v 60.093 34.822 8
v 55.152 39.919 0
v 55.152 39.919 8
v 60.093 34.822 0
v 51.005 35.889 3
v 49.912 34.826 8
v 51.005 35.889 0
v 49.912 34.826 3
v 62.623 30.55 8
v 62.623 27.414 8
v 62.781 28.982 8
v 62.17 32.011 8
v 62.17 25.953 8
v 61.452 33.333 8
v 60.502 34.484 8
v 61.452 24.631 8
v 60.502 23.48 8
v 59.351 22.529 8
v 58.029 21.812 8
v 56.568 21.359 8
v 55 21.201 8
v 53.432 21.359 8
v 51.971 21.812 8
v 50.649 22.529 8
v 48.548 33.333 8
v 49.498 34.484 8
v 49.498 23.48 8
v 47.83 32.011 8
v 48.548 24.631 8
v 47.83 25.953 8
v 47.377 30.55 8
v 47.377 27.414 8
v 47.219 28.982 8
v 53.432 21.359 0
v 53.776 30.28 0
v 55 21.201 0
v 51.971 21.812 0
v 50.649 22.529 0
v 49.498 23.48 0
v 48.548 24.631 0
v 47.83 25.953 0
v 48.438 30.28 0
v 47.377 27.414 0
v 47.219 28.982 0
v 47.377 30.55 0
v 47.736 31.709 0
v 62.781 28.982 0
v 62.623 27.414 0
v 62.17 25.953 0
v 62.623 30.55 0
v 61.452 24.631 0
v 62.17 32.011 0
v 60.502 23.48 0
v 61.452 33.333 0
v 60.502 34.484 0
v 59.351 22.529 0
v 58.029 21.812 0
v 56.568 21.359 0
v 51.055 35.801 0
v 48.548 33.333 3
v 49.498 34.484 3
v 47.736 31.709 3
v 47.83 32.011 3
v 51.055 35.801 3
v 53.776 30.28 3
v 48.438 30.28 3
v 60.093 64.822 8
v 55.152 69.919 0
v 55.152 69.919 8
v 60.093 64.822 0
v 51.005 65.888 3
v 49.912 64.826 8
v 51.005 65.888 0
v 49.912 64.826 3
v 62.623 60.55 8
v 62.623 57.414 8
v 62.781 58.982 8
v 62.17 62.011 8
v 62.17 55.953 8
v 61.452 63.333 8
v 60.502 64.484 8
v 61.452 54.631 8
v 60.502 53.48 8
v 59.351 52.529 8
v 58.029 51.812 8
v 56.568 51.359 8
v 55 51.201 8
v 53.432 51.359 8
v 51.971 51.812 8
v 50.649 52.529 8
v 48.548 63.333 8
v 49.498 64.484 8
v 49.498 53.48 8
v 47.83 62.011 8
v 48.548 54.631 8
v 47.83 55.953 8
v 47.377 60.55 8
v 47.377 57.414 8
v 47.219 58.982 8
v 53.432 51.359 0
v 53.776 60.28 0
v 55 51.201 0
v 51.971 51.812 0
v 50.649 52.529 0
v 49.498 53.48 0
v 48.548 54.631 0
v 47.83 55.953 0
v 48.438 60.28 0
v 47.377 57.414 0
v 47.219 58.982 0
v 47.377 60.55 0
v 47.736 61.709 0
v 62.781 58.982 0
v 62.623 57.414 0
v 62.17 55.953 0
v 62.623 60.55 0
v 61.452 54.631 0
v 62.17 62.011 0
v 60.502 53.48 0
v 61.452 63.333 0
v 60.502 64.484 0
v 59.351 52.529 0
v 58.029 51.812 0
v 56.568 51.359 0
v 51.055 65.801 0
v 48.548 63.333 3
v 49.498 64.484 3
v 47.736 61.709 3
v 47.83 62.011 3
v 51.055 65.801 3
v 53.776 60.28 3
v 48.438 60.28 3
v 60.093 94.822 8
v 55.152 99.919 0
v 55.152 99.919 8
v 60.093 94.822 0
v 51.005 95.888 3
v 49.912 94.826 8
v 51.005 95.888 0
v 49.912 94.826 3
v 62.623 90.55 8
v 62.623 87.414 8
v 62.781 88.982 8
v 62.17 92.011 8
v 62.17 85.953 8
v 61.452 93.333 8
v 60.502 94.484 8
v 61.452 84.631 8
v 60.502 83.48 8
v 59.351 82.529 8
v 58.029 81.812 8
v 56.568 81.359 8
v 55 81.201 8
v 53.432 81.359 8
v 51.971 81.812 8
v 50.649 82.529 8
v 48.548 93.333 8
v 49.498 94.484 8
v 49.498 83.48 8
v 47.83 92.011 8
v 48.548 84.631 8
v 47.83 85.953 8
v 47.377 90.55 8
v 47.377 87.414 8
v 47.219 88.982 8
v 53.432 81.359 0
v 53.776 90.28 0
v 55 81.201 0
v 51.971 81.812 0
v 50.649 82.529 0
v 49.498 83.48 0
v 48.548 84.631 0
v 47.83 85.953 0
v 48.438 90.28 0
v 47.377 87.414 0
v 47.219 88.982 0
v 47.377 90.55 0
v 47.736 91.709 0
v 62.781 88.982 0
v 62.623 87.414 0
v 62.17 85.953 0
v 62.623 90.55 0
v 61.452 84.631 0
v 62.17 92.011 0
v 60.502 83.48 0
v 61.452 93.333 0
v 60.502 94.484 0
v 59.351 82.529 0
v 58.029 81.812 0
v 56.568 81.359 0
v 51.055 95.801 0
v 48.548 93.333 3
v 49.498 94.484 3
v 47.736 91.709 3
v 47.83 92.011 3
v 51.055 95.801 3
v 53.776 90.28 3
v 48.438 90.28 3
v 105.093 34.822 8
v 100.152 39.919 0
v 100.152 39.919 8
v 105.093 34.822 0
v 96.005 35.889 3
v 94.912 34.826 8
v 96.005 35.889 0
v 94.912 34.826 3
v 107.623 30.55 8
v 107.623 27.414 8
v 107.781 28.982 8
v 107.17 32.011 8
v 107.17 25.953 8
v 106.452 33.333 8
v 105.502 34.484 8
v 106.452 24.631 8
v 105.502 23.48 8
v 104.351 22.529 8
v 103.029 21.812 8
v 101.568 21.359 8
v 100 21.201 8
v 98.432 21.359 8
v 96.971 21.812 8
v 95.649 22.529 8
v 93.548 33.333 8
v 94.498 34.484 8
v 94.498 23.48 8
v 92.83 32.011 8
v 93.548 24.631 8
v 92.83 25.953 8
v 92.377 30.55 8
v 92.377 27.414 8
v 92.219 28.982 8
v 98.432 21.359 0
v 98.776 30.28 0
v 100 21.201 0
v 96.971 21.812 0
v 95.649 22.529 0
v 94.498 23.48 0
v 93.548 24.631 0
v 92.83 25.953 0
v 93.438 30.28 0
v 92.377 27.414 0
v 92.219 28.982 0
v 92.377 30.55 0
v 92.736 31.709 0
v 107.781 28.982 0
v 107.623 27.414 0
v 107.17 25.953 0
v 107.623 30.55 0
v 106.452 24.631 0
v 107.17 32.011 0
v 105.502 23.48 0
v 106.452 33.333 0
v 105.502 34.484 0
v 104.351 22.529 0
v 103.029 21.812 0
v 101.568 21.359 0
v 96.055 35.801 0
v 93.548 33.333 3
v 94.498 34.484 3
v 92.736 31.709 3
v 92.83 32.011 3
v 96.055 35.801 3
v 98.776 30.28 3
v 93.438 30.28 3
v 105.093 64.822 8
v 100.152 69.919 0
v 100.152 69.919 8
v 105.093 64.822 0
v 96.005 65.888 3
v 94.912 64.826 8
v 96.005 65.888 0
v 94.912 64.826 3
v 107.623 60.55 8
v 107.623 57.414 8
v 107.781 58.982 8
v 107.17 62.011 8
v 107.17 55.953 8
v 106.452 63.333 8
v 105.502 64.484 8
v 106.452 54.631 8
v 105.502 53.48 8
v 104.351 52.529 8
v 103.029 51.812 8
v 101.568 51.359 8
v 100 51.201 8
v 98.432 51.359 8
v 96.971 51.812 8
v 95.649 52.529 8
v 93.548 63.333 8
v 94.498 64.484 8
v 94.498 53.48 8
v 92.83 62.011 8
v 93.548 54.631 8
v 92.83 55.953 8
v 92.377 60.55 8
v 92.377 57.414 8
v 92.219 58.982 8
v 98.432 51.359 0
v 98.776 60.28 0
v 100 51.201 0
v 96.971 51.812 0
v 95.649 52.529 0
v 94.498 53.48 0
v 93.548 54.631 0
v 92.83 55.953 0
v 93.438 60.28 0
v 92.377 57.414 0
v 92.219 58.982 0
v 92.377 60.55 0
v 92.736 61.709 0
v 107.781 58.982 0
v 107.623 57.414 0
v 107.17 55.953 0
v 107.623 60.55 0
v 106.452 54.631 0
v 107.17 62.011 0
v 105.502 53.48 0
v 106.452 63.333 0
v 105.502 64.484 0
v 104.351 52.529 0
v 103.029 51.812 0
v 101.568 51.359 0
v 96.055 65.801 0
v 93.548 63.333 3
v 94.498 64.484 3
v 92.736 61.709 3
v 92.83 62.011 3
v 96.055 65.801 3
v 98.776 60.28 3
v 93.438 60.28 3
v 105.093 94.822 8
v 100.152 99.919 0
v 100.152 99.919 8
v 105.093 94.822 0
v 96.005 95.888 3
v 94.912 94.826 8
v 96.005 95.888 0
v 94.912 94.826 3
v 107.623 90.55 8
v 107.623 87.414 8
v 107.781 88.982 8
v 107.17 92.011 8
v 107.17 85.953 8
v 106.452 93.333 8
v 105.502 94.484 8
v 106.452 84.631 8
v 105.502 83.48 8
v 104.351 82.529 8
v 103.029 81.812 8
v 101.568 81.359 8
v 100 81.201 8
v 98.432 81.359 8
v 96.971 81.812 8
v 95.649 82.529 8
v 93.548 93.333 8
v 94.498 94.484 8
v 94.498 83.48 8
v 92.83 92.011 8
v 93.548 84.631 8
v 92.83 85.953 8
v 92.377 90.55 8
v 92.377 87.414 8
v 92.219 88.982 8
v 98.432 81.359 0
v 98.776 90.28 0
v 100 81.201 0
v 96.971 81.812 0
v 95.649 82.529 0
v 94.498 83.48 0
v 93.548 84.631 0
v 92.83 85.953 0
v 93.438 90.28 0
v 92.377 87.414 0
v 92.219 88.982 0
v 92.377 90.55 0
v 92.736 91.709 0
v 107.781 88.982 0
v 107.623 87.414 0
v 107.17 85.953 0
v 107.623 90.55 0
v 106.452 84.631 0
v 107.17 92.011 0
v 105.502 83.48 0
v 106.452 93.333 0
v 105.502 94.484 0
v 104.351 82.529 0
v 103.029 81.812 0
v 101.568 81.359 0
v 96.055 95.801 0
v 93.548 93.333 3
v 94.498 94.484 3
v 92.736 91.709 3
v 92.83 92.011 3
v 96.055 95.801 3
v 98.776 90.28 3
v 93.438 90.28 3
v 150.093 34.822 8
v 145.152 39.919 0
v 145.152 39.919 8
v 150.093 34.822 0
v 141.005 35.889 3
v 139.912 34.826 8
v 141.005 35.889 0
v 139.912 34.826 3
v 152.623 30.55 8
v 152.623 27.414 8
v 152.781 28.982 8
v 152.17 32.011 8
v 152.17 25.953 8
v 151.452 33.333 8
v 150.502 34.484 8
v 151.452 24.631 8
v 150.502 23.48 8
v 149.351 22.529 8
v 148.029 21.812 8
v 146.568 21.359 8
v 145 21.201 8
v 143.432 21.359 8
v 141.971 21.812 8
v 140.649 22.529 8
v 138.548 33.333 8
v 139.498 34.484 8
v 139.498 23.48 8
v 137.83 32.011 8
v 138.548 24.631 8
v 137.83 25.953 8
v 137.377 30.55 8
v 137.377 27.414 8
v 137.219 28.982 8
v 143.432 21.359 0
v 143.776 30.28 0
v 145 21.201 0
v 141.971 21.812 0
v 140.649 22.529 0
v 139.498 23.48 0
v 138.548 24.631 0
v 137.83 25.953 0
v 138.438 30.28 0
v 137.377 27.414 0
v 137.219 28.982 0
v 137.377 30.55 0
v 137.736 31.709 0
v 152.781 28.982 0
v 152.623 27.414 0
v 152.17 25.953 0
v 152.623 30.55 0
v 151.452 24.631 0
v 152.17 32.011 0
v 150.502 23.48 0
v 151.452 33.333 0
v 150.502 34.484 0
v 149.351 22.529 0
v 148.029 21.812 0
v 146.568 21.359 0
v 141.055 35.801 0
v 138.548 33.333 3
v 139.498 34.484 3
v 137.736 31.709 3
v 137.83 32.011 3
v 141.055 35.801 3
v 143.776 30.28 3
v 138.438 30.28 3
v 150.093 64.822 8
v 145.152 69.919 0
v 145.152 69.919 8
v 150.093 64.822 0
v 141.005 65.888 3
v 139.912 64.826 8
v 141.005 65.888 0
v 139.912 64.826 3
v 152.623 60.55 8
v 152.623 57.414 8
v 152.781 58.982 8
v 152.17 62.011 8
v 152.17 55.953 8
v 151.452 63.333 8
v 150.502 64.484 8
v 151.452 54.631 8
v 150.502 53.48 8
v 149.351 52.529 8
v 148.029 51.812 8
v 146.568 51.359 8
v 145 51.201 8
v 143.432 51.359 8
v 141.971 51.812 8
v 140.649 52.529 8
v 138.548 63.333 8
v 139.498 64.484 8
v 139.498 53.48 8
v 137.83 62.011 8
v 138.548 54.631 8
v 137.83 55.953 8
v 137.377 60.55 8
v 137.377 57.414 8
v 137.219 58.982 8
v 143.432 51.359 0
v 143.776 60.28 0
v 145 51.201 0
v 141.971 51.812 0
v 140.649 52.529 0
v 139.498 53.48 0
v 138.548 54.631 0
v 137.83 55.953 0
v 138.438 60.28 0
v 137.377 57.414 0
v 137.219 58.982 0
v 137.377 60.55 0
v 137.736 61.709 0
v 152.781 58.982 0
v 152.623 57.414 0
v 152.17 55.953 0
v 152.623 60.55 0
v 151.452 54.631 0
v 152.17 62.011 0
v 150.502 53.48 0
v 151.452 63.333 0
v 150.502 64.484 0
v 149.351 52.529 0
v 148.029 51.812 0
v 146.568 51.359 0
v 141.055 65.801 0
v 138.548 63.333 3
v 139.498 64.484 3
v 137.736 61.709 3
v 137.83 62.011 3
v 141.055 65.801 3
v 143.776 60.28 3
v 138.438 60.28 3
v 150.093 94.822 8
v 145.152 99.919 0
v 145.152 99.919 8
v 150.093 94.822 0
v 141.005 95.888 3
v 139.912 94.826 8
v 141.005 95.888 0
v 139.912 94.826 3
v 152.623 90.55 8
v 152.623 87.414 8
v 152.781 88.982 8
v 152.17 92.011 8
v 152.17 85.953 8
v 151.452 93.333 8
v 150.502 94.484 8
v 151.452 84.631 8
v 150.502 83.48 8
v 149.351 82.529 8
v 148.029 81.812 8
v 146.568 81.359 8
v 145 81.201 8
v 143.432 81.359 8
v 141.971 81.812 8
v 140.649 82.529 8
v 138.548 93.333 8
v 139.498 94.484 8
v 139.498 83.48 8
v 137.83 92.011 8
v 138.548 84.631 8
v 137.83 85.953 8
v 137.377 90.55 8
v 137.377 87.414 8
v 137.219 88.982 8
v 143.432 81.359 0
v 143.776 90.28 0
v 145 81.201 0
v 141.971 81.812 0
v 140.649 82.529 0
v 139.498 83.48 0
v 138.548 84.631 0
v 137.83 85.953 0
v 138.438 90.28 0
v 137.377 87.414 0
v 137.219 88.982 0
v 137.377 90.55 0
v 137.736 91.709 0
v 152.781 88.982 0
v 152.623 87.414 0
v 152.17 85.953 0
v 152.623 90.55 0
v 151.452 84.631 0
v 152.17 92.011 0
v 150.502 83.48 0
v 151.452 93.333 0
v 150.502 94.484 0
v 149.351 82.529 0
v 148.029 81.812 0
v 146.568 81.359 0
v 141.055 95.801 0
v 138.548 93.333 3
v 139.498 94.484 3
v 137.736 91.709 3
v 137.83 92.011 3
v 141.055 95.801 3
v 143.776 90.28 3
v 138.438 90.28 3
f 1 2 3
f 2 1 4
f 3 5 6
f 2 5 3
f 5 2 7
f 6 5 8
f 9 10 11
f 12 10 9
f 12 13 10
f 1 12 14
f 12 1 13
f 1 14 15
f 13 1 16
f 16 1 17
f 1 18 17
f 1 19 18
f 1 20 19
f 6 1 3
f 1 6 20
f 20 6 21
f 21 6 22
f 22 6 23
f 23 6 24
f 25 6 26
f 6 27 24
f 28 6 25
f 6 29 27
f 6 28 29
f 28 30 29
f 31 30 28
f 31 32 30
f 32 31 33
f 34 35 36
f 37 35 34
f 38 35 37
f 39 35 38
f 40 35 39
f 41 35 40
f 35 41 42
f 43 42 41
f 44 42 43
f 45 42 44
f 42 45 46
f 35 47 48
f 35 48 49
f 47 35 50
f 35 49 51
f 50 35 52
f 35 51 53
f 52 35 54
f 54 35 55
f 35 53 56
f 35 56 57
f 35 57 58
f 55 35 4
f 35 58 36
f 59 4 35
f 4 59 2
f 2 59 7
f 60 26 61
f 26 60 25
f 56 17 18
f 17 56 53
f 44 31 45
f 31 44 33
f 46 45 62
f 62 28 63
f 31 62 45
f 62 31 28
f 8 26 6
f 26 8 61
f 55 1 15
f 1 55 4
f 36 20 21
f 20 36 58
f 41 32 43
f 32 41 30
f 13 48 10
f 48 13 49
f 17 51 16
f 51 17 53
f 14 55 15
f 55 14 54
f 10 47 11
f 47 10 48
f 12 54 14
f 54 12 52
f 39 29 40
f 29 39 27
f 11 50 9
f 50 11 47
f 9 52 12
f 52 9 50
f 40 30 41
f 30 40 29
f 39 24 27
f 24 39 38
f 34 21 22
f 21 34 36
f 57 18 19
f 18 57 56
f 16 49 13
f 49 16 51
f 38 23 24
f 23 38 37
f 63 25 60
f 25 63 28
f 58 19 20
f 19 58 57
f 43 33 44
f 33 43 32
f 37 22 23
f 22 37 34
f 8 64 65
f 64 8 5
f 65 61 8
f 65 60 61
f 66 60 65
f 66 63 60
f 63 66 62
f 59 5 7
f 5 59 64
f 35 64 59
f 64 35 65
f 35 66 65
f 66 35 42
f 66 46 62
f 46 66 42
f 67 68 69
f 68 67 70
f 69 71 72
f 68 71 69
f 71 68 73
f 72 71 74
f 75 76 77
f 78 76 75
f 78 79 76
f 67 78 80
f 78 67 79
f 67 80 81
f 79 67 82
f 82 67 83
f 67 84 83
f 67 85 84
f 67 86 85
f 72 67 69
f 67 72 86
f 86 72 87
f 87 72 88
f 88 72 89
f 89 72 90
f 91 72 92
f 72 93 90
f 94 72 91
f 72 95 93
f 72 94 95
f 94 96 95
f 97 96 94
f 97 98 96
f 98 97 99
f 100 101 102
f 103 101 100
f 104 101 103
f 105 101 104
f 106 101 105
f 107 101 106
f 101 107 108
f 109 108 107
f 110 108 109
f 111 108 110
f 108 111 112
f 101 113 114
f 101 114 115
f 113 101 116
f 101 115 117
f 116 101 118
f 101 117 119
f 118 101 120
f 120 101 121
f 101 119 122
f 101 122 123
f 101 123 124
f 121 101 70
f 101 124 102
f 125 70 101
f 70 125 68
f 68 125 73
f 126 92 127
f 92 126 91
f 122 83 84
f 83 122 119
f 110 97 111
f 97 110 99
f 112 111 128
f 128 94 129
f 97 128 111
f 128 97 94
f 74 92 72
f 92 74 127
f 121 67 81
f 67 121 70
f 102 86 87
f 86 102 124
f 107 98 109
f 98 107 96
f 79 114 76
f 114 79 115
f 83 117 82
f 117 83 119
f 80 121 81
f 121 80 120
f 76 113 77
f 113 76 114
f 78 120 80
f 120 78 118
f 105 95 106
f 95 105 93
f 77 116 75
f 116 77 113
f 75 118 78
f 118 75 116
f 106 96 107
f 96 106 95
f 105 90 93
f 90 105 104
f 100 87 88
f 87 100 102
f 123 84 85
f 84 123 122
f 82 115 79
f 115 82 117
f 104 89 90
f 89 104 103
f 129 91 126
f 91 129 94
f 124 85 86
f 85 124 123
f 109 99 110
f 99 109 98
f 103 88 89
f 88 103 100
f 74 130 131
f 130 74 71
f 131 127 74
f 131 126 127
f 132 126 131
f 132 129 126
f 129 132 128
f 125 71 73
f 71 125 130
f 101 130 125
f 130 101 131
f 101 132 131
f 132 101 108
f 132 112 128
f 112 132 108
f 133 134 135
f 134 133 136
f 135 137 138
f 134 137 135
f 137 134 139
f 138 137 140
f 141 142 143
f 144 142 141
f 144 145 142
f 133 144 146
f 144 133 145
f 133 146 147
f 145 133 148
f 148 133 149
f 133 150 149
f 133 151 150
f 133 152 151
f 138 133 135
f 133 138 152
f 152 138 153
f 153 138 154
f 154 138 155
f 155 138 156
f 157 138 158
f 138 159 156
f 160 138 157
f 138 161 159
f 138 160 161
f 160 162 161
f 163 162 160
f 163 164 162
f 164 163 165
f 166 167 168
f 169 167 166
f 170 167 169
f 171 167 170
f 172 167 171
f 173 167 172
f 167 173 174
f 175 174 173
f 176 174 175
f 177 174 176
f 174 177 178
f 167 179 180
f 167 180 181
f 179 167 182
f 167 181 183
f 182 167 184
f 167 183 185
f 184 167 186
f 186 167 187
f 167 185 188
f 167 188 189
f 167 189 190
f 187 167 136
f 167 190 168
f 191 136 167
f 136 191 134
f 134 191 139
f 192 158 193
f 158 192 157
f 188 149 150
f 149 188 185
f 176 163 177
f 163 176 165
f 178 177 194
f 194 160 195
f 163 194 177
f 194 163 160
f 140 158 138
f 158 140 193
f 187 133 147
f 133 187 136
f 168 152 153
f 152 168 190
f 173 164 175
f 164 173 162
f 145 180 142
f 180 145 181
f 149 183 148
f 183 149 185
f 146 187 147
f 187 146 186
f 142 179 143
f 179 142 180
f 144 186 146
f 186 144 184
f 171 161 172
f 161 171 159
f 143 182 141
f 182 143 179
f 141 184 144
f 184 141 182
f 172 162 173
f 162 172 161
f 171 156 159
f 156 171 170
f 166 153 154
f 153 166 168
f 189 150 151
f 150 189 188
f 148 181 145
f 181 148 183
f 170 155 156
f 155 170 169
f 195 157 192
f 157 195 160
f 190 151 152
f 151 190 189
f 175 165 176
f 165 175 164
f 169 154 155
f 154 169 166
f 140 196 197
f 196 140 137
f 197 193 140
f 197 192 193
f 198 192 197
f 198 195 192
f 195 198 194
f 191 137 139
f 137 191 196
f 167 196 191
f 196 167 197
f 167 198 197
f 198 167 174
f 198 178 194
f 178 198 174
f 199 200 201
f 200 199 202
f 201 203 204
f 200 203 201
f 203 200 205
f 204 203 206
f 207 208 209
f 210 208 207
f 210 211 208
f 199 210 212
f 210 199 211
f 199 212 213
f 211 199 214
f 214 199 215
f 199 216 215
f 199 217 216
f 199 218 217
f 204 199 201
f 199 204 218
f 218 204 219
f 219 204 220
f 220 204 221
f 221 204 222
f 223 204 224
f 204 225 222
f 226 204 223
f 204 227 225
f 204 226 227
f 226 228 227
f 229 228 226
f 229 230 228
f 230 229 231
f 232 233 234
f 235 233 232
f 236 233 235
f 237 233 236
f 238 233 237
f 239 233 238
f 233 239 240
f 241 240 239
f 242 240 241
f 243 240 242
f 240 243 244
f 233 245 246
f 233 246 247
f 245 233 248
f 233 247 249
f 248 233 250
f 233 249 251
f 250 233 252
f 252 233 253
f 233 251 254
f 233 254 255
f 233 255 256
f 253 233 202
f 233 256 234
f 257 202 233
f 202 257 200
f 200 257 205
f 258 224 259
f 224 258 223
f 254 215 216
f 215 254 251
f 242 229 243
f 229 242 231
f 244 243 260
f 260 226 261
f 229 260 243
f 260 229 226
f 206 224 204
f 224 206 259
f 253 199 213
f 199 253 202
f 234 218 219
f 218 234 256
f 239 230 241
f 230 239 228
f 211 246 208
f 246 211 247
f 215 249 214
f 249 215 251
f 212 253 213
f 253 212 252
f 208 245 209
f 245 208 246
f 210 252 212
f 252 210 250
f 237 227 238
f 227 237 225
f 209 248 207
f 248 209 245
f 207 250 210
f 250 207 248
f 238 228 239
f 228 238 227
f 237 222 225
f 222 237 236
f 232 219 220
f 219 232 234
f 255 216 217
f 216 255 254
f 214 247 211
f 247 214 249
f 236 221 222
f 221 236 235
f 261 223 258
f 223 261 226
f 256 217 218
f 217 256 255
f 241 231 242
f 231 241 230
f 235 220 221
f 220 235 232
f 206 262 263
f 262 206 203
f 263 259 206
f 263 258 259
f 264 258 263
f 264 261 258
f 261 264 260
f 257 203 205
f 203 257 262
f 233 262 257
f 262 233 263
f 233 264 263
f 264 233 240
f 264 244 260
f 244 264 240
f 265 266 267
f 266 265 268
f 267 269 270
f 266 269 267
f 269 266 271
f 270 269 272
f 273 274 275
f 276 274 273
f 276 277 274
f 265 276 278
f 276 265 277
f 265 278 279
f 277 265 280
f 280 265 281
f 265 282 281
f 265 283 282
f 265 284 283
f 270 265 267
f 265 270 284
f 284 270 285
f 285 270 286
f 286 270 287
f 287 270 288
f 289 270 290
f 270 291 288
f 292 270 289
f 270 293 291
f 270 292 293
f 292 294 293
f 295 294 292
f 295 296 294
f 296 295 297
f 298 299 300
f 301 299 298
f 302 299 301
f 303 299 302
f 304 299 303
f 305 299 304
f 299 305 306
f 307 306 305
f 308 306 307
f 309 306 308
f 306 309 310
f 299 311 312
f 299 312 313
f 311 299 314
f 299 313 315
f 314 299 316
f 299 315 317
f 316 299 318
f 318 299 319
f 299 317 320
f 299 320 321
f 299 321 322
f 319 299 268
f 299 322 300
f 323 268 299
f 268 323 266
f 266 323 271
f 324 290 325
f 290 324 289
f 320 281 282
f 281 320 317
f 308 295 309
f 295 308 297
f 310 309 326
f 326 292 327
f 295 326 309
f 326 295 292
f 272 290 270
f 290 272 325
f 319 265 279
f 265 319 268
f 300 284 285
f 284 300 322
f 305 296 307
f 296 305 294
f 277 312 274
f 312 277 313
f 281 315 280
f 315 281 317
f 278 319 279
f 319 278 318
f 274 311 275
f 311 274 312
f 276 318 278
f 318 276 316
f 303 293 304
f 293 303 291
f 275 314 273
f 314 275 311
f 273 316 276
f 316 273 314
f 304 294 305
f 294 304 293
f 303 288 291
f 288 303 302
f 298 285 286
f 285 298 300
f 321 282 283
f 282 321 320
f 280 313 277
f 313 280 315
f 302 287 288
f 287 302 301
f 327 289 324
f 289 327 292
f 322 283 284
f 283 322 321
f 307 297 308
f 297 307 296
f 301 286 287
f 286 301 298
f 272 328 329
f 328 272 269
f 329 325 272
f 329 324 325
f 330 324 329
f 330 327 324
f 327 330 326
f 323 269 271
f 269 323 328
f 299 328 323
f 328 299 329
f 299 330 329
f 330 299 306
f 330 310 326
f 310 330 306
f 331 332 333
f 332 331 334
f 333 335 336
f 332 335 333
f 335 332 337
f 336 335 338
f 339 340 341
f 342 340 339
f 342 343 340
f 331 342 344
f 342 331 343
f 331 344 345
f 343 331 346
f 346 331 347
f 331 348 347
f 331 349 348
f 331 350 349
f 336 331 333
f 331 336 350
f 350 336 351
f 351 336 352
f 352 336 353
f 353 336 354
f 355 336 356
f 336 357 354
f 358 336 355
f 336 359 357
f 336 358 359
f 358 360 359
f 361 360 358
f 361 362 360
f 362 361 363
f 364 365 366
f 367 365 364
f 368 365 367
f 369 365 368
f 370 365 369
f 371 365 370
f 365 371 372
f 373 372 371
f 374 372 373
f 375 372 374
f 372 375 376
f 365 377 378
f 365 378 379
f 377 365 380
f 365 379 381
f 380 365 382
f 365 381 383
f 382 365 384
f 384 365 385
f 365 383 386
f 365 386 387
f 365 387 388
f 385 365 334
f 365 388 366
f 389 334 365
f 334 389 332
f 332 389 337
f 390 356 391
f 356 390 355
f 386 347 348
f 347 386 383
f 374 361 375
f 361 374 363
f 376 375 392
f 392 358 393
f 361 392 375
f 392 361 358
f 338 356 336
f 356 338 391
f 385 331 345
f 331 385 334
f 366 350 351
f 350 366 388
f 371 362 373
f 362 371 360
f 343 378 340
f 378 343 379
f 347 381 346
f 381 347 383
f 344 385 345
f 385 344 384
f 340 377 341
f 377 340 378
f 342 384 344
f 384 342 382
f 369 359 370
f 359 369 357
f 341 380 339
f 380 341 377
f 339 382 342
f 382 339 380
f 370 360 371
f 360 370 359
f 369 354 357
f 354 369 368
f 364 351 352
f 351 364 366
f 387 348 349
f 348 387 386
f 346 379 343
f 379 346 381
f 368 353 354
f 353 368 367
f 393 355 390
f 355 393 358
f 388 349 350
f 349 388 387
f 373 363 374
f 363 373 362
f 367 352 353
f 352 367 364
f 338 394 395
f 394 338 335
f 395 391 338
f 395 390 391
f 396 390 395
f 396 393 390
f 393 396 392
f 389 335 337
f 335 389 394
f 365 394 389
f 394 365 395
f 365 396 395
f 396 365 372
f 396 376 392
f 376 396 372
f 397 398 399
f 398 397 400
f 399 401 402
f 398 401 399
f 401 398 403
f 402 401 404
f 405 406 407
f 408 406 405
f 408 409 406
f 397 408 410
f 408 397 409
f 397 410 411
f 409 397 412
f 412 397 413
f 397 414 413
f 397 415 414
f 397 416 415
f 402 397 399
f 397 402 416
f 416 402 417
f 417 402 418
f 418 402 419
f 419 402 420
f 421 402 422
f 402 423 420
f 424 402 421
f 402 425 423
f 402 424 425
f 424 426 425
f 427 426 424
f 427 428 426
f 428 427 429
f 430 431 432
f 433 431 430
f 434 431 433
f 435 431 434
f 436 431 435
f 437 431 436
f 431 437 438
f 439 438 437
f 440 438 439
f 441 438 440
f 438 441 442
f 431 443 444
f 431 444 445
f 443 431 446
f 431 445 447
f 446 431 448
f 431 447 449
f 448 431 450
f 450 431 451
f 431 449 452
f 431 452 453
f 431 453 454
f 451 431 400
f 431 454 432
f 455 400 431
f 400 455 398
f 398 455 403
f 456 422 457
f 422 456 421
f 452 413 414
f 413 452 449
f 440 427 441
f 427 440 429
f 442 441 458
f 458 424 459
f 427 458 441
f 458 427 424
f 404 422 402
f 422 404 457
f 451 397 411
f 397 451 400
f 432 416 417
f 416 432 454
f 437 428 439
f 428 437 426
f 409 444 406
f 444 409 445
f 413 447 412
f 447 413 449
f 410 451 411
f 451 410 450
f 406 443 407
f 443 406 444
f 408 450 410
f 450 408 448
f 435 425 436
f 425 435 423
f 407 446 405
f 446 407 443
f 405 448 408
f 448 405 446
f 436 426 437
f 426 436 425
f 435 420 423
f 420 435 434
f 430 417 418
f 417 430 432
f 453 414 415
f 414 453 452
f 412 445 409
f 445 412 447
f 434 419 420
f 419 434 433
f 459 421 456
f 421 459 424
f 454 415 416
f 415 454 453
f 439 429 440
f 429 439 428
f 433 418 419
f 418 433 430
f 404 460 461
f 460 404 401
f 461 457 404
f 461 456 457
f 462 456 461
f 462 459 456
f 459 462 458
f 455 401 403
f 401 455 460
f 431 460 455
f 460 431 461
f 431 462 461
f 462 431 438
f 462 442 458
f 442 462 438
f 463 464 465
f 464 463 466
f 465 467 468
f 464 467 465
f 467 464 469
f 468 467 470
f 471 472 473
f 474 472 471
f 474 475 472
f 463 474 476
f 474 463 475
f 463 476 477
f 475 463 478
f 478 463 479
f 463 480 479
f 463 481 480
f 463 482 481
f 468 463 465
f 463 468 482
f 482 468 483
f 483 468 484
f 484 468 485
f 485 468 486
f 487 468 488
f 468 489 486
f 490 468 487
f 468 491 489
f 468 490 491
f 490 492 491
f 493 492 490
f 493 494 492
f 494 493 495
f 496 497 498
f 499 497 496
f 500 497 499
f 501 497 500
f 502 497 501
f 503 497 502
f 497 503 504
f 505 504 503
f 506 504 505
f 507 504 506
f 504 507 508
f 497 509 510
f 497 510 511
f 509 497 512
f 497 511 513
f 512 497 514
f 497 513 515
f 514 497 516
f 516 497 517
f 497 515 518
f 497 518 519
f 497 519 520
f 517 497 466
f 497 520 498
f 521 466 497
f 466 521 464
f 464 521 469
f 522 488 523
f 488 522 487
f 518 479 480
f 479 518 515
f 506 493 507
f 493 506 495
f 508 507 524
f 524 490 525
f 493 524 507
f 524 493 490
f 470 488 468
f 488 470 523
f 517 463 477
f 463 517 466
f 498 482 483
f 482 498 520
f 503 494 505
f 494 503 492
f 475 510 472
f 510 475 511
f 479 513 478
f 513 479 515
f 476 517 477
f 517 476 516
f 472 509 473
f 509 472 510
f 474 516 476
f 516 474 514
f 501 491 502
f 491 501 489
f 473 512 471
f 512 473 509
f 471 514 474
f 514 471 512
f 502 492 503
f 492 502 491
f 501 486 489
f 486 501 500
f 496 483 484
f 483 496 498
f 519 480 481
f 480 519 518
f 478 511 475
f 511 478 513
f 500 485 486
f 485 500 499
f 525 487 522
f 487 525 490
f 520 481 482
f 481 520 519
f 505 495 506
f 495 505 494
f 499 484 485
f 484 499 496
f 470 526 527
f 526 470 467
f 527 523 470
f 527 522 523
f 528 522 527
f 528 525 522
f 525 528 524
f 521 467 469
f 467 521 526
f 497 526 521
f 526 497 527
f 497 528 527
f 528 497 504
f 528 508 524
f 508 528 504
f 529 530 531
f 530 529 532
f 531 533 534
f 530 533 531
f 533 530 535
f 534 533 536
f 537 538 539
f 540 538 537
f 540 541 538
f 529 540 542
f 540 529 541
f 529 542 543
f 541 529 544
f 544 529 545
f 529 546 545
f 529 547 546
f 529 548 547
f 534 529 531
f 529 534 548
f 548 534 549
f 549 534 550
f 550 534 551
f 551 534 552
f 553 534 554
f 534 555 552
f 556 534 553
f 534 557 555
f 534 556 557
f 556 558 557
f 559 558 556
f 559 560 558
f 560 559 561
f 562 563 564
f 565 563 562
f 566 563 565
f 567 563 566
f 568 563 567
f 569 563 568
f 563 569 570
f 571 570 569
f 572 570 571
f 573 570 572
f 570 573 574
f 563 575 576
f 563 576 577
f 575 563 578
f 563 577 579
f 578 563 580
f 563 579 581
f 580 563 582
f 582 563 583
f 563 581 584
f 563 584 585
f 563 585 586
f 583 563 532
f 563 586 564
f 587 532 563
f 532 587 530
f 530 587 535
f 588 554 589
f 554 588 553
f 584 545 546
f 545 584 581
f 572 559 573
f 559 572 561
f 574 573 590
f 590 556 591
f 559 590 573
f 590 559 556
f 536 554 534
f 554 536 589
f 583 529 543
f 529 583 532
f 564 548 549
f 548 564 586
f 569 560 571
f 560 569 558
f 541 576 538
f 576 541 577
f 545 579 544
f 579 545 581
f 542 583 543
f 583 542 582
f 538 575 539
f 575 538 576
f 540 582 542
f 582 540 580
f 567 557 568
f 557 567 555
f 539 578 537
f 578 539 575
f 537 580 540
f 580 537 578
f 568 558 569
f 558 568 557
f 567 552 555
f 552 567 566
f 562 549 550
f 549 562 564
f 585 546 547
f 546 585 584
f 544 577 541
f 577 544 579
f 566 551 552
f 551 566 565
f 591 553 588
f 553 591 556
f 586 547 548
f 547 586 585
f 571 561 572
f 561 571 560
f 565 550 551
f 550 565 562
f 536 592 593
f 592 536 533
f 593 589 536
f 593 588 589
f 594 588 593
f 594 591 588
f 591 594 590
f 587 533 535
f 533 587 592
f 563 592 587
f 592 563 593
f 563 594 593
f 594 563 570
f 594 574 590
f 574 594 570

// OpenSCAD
// Module names are of the form poly_<inkscape-path-id>().  As a result,
// you can associate a polygon in this OpenSCAD program with the corresponding
// SVG element in the Inkscape document by looking for the XML element with
// the attribute id="inkscape-path-id".

// fudge value is used to ensure that subtracted solids are a tad taller
// in the z dimension than the polygon being subtracted from.  This helps
// keep the resulting .stl file manifold.
fudge = 0.1;

sq=3;

for(x=[1:3]) for(y=[1:3])
{
	translate([45*x,30*y,0])
	{
		//ps();
		//rs();
		teardrops();
	}
}

module ps()
{
	difference()
	{
		P(11);
		translate([0,0,-3])
		R(6);
	}
}

module rs()
{
	difference()
	{
		R(6);
		translate([0,0,3])
		P(11);
		translate([0,0,3])
		teardrop(8);
	}
}

module teardrops()
{
	difference()
	{
		teardrop(8);
		translate([0,0,-3])
		R(6);
	}
}


module teardrop(h)
{translate([10,0.56,0])
	color("blue")
	union()
	{
		teardrop_rect(h);
		teardrop_disc(h);
	}
}

module teardrop_rect(h)
{
  scale([50/90, -50/90, 1]) union()
  {
    linear_extrude(height=h)
      polygon([[0.272896,-16.847050],[10.643298,-6.148848],[0.031698,4.166752],[-10.338704,-6.531450]]);
  }
}

module teardrop_disc(h)
{
  scale([50/90, -50/90, 1]) union()
  {
    linear_extrude(height=h)
      polygon([[14.006500,2.840551],[13.721938,5.663350],[12.905800,8.292513],[11.614410,10.671718],[9.904091,12.744642],[7.831168,14.454960],[5.451962,15.746350],[2.822799,16.562488],[0.000000,16.847050],[-2.822798,16.562488],[-5.451962,15.746350],[-7.831167,14.454960],[-9.904091,12.744642],[-11.614410,10.671718],[-12.905800,8.292513],[-13.721938,5.663350],[-14.006500,2.840551],[-13.721938,0.017753],[-12.905800,-2.611411],[-11.614410,-4.990616],[-9.904091,-7.063540],[-7.831167,-8.773859],[-5.451962,-10.065249],[-2.822798,-10.881387],[0.000000,-11.165949],[2.822799,-10.881387],[5.451962,-10.065249],[7.831168,-8.773859],[9.904091,-7.063540],[11.614410,-4.990616],[12.905800,-2.611411],[13.721938,0.017753],[14.006500,2.840551]]);
  }
}

module P(h)
{translate([4,10,0]) color("white")
union()
{
 
  scale([50/90, -50/90, 1]) union()
  {
    difference()
    {
       linear_extrude(height=h)
         polygon([[-47.782586,-1.402984],[-32.806024,-1.402984],[-29.661018,-1.216930],[-26.905652,-0.658818],[-24.539925,0.271351],[-22.563836,1.573578],[-20.995007,3.208360],[-19.874408,5.159537],[-19.202038,7.427109],[-18.977899,10.011078],[-19.202038,12.606791],[-19.874408,14.886091],[-20.995007,16.848978],[-22.563836,18.495453],[-24.539925,19.787452],[-26.905652,20.710306],[-29.661018,21.264014],[-32.806024,21.448578],[-38.759149,21.448578],[-38.759149,33.589202],[-47.782586,33.589202],[-47.782586,-1.402985]]);
       translate([0, 0, -fudge])
         linear_extrude(height=h+2*fudge)
           polygon([[-38.759149,5.136077],[-38.759149,14.909515],[-33.766961,14.909515],[-31.440805,14.593124],[-29.712274,13.643890],[-28.640026,12.091172],[-28.282586,10.011077],[-28.640026,7.936878],[-29.712274,6.401702],[-31.440805,5.452505],[-33.766961,5.136077]]);
    }
  }
}
}


module R(h)
{translate([0,10,0])
  color("red")
  scale([50/90, -50/90, 1]) union()
  {
    difference()
    {
       linear_extrude(height=h)
         polygon([[-6.773438,4.253907],[-6.773438,17.496094],[-15.796875,17.496094],[-15.796875,-17.496094],[-2.015625,-17.496094],[1.209948,-17.351054],[3.972638,-16.915989],[6.272447,-16.190898],[8.109375,-15.175781],[9.524396,-13.847151],[10.535133,-12.181618],[11.141584,-10.179182],[11.343750,-7.839844],[10.921851,-4.681624],[9.656250,-2.144531],[7.564432,-0.210924],[4.617187,1.136719],[6.369121,1.828137],[7.921875,3.058594],[9.404275,4.921884],[10.898437,7.558594],[15.796875,17.496094],[6.187500,17.496094],[1.921875,8.800781],[0.621078,6.591805],[-0.703125,5.214844],[-2.238295,4.494150],[-4.218750,4.253906],[-6.773438,4.253906]]);
       translate([0, 0, -fudge])
         linear_extrude(height=h+2*fudge)
           polygon([[-2.976563,-1.980468],[-0.544937,-2.244126],[1.078125,-3.035156],[2.009749,-4.429671],[2.320312,-6.503906],[2.009749,-8.554668],[1.078125,-9.925781],[-0.544937,-10.699198],[-2.976563,-10.957031],[-6.773438,-10.957031],[-6.773438,-1.980468]]);
    }
  }
}
